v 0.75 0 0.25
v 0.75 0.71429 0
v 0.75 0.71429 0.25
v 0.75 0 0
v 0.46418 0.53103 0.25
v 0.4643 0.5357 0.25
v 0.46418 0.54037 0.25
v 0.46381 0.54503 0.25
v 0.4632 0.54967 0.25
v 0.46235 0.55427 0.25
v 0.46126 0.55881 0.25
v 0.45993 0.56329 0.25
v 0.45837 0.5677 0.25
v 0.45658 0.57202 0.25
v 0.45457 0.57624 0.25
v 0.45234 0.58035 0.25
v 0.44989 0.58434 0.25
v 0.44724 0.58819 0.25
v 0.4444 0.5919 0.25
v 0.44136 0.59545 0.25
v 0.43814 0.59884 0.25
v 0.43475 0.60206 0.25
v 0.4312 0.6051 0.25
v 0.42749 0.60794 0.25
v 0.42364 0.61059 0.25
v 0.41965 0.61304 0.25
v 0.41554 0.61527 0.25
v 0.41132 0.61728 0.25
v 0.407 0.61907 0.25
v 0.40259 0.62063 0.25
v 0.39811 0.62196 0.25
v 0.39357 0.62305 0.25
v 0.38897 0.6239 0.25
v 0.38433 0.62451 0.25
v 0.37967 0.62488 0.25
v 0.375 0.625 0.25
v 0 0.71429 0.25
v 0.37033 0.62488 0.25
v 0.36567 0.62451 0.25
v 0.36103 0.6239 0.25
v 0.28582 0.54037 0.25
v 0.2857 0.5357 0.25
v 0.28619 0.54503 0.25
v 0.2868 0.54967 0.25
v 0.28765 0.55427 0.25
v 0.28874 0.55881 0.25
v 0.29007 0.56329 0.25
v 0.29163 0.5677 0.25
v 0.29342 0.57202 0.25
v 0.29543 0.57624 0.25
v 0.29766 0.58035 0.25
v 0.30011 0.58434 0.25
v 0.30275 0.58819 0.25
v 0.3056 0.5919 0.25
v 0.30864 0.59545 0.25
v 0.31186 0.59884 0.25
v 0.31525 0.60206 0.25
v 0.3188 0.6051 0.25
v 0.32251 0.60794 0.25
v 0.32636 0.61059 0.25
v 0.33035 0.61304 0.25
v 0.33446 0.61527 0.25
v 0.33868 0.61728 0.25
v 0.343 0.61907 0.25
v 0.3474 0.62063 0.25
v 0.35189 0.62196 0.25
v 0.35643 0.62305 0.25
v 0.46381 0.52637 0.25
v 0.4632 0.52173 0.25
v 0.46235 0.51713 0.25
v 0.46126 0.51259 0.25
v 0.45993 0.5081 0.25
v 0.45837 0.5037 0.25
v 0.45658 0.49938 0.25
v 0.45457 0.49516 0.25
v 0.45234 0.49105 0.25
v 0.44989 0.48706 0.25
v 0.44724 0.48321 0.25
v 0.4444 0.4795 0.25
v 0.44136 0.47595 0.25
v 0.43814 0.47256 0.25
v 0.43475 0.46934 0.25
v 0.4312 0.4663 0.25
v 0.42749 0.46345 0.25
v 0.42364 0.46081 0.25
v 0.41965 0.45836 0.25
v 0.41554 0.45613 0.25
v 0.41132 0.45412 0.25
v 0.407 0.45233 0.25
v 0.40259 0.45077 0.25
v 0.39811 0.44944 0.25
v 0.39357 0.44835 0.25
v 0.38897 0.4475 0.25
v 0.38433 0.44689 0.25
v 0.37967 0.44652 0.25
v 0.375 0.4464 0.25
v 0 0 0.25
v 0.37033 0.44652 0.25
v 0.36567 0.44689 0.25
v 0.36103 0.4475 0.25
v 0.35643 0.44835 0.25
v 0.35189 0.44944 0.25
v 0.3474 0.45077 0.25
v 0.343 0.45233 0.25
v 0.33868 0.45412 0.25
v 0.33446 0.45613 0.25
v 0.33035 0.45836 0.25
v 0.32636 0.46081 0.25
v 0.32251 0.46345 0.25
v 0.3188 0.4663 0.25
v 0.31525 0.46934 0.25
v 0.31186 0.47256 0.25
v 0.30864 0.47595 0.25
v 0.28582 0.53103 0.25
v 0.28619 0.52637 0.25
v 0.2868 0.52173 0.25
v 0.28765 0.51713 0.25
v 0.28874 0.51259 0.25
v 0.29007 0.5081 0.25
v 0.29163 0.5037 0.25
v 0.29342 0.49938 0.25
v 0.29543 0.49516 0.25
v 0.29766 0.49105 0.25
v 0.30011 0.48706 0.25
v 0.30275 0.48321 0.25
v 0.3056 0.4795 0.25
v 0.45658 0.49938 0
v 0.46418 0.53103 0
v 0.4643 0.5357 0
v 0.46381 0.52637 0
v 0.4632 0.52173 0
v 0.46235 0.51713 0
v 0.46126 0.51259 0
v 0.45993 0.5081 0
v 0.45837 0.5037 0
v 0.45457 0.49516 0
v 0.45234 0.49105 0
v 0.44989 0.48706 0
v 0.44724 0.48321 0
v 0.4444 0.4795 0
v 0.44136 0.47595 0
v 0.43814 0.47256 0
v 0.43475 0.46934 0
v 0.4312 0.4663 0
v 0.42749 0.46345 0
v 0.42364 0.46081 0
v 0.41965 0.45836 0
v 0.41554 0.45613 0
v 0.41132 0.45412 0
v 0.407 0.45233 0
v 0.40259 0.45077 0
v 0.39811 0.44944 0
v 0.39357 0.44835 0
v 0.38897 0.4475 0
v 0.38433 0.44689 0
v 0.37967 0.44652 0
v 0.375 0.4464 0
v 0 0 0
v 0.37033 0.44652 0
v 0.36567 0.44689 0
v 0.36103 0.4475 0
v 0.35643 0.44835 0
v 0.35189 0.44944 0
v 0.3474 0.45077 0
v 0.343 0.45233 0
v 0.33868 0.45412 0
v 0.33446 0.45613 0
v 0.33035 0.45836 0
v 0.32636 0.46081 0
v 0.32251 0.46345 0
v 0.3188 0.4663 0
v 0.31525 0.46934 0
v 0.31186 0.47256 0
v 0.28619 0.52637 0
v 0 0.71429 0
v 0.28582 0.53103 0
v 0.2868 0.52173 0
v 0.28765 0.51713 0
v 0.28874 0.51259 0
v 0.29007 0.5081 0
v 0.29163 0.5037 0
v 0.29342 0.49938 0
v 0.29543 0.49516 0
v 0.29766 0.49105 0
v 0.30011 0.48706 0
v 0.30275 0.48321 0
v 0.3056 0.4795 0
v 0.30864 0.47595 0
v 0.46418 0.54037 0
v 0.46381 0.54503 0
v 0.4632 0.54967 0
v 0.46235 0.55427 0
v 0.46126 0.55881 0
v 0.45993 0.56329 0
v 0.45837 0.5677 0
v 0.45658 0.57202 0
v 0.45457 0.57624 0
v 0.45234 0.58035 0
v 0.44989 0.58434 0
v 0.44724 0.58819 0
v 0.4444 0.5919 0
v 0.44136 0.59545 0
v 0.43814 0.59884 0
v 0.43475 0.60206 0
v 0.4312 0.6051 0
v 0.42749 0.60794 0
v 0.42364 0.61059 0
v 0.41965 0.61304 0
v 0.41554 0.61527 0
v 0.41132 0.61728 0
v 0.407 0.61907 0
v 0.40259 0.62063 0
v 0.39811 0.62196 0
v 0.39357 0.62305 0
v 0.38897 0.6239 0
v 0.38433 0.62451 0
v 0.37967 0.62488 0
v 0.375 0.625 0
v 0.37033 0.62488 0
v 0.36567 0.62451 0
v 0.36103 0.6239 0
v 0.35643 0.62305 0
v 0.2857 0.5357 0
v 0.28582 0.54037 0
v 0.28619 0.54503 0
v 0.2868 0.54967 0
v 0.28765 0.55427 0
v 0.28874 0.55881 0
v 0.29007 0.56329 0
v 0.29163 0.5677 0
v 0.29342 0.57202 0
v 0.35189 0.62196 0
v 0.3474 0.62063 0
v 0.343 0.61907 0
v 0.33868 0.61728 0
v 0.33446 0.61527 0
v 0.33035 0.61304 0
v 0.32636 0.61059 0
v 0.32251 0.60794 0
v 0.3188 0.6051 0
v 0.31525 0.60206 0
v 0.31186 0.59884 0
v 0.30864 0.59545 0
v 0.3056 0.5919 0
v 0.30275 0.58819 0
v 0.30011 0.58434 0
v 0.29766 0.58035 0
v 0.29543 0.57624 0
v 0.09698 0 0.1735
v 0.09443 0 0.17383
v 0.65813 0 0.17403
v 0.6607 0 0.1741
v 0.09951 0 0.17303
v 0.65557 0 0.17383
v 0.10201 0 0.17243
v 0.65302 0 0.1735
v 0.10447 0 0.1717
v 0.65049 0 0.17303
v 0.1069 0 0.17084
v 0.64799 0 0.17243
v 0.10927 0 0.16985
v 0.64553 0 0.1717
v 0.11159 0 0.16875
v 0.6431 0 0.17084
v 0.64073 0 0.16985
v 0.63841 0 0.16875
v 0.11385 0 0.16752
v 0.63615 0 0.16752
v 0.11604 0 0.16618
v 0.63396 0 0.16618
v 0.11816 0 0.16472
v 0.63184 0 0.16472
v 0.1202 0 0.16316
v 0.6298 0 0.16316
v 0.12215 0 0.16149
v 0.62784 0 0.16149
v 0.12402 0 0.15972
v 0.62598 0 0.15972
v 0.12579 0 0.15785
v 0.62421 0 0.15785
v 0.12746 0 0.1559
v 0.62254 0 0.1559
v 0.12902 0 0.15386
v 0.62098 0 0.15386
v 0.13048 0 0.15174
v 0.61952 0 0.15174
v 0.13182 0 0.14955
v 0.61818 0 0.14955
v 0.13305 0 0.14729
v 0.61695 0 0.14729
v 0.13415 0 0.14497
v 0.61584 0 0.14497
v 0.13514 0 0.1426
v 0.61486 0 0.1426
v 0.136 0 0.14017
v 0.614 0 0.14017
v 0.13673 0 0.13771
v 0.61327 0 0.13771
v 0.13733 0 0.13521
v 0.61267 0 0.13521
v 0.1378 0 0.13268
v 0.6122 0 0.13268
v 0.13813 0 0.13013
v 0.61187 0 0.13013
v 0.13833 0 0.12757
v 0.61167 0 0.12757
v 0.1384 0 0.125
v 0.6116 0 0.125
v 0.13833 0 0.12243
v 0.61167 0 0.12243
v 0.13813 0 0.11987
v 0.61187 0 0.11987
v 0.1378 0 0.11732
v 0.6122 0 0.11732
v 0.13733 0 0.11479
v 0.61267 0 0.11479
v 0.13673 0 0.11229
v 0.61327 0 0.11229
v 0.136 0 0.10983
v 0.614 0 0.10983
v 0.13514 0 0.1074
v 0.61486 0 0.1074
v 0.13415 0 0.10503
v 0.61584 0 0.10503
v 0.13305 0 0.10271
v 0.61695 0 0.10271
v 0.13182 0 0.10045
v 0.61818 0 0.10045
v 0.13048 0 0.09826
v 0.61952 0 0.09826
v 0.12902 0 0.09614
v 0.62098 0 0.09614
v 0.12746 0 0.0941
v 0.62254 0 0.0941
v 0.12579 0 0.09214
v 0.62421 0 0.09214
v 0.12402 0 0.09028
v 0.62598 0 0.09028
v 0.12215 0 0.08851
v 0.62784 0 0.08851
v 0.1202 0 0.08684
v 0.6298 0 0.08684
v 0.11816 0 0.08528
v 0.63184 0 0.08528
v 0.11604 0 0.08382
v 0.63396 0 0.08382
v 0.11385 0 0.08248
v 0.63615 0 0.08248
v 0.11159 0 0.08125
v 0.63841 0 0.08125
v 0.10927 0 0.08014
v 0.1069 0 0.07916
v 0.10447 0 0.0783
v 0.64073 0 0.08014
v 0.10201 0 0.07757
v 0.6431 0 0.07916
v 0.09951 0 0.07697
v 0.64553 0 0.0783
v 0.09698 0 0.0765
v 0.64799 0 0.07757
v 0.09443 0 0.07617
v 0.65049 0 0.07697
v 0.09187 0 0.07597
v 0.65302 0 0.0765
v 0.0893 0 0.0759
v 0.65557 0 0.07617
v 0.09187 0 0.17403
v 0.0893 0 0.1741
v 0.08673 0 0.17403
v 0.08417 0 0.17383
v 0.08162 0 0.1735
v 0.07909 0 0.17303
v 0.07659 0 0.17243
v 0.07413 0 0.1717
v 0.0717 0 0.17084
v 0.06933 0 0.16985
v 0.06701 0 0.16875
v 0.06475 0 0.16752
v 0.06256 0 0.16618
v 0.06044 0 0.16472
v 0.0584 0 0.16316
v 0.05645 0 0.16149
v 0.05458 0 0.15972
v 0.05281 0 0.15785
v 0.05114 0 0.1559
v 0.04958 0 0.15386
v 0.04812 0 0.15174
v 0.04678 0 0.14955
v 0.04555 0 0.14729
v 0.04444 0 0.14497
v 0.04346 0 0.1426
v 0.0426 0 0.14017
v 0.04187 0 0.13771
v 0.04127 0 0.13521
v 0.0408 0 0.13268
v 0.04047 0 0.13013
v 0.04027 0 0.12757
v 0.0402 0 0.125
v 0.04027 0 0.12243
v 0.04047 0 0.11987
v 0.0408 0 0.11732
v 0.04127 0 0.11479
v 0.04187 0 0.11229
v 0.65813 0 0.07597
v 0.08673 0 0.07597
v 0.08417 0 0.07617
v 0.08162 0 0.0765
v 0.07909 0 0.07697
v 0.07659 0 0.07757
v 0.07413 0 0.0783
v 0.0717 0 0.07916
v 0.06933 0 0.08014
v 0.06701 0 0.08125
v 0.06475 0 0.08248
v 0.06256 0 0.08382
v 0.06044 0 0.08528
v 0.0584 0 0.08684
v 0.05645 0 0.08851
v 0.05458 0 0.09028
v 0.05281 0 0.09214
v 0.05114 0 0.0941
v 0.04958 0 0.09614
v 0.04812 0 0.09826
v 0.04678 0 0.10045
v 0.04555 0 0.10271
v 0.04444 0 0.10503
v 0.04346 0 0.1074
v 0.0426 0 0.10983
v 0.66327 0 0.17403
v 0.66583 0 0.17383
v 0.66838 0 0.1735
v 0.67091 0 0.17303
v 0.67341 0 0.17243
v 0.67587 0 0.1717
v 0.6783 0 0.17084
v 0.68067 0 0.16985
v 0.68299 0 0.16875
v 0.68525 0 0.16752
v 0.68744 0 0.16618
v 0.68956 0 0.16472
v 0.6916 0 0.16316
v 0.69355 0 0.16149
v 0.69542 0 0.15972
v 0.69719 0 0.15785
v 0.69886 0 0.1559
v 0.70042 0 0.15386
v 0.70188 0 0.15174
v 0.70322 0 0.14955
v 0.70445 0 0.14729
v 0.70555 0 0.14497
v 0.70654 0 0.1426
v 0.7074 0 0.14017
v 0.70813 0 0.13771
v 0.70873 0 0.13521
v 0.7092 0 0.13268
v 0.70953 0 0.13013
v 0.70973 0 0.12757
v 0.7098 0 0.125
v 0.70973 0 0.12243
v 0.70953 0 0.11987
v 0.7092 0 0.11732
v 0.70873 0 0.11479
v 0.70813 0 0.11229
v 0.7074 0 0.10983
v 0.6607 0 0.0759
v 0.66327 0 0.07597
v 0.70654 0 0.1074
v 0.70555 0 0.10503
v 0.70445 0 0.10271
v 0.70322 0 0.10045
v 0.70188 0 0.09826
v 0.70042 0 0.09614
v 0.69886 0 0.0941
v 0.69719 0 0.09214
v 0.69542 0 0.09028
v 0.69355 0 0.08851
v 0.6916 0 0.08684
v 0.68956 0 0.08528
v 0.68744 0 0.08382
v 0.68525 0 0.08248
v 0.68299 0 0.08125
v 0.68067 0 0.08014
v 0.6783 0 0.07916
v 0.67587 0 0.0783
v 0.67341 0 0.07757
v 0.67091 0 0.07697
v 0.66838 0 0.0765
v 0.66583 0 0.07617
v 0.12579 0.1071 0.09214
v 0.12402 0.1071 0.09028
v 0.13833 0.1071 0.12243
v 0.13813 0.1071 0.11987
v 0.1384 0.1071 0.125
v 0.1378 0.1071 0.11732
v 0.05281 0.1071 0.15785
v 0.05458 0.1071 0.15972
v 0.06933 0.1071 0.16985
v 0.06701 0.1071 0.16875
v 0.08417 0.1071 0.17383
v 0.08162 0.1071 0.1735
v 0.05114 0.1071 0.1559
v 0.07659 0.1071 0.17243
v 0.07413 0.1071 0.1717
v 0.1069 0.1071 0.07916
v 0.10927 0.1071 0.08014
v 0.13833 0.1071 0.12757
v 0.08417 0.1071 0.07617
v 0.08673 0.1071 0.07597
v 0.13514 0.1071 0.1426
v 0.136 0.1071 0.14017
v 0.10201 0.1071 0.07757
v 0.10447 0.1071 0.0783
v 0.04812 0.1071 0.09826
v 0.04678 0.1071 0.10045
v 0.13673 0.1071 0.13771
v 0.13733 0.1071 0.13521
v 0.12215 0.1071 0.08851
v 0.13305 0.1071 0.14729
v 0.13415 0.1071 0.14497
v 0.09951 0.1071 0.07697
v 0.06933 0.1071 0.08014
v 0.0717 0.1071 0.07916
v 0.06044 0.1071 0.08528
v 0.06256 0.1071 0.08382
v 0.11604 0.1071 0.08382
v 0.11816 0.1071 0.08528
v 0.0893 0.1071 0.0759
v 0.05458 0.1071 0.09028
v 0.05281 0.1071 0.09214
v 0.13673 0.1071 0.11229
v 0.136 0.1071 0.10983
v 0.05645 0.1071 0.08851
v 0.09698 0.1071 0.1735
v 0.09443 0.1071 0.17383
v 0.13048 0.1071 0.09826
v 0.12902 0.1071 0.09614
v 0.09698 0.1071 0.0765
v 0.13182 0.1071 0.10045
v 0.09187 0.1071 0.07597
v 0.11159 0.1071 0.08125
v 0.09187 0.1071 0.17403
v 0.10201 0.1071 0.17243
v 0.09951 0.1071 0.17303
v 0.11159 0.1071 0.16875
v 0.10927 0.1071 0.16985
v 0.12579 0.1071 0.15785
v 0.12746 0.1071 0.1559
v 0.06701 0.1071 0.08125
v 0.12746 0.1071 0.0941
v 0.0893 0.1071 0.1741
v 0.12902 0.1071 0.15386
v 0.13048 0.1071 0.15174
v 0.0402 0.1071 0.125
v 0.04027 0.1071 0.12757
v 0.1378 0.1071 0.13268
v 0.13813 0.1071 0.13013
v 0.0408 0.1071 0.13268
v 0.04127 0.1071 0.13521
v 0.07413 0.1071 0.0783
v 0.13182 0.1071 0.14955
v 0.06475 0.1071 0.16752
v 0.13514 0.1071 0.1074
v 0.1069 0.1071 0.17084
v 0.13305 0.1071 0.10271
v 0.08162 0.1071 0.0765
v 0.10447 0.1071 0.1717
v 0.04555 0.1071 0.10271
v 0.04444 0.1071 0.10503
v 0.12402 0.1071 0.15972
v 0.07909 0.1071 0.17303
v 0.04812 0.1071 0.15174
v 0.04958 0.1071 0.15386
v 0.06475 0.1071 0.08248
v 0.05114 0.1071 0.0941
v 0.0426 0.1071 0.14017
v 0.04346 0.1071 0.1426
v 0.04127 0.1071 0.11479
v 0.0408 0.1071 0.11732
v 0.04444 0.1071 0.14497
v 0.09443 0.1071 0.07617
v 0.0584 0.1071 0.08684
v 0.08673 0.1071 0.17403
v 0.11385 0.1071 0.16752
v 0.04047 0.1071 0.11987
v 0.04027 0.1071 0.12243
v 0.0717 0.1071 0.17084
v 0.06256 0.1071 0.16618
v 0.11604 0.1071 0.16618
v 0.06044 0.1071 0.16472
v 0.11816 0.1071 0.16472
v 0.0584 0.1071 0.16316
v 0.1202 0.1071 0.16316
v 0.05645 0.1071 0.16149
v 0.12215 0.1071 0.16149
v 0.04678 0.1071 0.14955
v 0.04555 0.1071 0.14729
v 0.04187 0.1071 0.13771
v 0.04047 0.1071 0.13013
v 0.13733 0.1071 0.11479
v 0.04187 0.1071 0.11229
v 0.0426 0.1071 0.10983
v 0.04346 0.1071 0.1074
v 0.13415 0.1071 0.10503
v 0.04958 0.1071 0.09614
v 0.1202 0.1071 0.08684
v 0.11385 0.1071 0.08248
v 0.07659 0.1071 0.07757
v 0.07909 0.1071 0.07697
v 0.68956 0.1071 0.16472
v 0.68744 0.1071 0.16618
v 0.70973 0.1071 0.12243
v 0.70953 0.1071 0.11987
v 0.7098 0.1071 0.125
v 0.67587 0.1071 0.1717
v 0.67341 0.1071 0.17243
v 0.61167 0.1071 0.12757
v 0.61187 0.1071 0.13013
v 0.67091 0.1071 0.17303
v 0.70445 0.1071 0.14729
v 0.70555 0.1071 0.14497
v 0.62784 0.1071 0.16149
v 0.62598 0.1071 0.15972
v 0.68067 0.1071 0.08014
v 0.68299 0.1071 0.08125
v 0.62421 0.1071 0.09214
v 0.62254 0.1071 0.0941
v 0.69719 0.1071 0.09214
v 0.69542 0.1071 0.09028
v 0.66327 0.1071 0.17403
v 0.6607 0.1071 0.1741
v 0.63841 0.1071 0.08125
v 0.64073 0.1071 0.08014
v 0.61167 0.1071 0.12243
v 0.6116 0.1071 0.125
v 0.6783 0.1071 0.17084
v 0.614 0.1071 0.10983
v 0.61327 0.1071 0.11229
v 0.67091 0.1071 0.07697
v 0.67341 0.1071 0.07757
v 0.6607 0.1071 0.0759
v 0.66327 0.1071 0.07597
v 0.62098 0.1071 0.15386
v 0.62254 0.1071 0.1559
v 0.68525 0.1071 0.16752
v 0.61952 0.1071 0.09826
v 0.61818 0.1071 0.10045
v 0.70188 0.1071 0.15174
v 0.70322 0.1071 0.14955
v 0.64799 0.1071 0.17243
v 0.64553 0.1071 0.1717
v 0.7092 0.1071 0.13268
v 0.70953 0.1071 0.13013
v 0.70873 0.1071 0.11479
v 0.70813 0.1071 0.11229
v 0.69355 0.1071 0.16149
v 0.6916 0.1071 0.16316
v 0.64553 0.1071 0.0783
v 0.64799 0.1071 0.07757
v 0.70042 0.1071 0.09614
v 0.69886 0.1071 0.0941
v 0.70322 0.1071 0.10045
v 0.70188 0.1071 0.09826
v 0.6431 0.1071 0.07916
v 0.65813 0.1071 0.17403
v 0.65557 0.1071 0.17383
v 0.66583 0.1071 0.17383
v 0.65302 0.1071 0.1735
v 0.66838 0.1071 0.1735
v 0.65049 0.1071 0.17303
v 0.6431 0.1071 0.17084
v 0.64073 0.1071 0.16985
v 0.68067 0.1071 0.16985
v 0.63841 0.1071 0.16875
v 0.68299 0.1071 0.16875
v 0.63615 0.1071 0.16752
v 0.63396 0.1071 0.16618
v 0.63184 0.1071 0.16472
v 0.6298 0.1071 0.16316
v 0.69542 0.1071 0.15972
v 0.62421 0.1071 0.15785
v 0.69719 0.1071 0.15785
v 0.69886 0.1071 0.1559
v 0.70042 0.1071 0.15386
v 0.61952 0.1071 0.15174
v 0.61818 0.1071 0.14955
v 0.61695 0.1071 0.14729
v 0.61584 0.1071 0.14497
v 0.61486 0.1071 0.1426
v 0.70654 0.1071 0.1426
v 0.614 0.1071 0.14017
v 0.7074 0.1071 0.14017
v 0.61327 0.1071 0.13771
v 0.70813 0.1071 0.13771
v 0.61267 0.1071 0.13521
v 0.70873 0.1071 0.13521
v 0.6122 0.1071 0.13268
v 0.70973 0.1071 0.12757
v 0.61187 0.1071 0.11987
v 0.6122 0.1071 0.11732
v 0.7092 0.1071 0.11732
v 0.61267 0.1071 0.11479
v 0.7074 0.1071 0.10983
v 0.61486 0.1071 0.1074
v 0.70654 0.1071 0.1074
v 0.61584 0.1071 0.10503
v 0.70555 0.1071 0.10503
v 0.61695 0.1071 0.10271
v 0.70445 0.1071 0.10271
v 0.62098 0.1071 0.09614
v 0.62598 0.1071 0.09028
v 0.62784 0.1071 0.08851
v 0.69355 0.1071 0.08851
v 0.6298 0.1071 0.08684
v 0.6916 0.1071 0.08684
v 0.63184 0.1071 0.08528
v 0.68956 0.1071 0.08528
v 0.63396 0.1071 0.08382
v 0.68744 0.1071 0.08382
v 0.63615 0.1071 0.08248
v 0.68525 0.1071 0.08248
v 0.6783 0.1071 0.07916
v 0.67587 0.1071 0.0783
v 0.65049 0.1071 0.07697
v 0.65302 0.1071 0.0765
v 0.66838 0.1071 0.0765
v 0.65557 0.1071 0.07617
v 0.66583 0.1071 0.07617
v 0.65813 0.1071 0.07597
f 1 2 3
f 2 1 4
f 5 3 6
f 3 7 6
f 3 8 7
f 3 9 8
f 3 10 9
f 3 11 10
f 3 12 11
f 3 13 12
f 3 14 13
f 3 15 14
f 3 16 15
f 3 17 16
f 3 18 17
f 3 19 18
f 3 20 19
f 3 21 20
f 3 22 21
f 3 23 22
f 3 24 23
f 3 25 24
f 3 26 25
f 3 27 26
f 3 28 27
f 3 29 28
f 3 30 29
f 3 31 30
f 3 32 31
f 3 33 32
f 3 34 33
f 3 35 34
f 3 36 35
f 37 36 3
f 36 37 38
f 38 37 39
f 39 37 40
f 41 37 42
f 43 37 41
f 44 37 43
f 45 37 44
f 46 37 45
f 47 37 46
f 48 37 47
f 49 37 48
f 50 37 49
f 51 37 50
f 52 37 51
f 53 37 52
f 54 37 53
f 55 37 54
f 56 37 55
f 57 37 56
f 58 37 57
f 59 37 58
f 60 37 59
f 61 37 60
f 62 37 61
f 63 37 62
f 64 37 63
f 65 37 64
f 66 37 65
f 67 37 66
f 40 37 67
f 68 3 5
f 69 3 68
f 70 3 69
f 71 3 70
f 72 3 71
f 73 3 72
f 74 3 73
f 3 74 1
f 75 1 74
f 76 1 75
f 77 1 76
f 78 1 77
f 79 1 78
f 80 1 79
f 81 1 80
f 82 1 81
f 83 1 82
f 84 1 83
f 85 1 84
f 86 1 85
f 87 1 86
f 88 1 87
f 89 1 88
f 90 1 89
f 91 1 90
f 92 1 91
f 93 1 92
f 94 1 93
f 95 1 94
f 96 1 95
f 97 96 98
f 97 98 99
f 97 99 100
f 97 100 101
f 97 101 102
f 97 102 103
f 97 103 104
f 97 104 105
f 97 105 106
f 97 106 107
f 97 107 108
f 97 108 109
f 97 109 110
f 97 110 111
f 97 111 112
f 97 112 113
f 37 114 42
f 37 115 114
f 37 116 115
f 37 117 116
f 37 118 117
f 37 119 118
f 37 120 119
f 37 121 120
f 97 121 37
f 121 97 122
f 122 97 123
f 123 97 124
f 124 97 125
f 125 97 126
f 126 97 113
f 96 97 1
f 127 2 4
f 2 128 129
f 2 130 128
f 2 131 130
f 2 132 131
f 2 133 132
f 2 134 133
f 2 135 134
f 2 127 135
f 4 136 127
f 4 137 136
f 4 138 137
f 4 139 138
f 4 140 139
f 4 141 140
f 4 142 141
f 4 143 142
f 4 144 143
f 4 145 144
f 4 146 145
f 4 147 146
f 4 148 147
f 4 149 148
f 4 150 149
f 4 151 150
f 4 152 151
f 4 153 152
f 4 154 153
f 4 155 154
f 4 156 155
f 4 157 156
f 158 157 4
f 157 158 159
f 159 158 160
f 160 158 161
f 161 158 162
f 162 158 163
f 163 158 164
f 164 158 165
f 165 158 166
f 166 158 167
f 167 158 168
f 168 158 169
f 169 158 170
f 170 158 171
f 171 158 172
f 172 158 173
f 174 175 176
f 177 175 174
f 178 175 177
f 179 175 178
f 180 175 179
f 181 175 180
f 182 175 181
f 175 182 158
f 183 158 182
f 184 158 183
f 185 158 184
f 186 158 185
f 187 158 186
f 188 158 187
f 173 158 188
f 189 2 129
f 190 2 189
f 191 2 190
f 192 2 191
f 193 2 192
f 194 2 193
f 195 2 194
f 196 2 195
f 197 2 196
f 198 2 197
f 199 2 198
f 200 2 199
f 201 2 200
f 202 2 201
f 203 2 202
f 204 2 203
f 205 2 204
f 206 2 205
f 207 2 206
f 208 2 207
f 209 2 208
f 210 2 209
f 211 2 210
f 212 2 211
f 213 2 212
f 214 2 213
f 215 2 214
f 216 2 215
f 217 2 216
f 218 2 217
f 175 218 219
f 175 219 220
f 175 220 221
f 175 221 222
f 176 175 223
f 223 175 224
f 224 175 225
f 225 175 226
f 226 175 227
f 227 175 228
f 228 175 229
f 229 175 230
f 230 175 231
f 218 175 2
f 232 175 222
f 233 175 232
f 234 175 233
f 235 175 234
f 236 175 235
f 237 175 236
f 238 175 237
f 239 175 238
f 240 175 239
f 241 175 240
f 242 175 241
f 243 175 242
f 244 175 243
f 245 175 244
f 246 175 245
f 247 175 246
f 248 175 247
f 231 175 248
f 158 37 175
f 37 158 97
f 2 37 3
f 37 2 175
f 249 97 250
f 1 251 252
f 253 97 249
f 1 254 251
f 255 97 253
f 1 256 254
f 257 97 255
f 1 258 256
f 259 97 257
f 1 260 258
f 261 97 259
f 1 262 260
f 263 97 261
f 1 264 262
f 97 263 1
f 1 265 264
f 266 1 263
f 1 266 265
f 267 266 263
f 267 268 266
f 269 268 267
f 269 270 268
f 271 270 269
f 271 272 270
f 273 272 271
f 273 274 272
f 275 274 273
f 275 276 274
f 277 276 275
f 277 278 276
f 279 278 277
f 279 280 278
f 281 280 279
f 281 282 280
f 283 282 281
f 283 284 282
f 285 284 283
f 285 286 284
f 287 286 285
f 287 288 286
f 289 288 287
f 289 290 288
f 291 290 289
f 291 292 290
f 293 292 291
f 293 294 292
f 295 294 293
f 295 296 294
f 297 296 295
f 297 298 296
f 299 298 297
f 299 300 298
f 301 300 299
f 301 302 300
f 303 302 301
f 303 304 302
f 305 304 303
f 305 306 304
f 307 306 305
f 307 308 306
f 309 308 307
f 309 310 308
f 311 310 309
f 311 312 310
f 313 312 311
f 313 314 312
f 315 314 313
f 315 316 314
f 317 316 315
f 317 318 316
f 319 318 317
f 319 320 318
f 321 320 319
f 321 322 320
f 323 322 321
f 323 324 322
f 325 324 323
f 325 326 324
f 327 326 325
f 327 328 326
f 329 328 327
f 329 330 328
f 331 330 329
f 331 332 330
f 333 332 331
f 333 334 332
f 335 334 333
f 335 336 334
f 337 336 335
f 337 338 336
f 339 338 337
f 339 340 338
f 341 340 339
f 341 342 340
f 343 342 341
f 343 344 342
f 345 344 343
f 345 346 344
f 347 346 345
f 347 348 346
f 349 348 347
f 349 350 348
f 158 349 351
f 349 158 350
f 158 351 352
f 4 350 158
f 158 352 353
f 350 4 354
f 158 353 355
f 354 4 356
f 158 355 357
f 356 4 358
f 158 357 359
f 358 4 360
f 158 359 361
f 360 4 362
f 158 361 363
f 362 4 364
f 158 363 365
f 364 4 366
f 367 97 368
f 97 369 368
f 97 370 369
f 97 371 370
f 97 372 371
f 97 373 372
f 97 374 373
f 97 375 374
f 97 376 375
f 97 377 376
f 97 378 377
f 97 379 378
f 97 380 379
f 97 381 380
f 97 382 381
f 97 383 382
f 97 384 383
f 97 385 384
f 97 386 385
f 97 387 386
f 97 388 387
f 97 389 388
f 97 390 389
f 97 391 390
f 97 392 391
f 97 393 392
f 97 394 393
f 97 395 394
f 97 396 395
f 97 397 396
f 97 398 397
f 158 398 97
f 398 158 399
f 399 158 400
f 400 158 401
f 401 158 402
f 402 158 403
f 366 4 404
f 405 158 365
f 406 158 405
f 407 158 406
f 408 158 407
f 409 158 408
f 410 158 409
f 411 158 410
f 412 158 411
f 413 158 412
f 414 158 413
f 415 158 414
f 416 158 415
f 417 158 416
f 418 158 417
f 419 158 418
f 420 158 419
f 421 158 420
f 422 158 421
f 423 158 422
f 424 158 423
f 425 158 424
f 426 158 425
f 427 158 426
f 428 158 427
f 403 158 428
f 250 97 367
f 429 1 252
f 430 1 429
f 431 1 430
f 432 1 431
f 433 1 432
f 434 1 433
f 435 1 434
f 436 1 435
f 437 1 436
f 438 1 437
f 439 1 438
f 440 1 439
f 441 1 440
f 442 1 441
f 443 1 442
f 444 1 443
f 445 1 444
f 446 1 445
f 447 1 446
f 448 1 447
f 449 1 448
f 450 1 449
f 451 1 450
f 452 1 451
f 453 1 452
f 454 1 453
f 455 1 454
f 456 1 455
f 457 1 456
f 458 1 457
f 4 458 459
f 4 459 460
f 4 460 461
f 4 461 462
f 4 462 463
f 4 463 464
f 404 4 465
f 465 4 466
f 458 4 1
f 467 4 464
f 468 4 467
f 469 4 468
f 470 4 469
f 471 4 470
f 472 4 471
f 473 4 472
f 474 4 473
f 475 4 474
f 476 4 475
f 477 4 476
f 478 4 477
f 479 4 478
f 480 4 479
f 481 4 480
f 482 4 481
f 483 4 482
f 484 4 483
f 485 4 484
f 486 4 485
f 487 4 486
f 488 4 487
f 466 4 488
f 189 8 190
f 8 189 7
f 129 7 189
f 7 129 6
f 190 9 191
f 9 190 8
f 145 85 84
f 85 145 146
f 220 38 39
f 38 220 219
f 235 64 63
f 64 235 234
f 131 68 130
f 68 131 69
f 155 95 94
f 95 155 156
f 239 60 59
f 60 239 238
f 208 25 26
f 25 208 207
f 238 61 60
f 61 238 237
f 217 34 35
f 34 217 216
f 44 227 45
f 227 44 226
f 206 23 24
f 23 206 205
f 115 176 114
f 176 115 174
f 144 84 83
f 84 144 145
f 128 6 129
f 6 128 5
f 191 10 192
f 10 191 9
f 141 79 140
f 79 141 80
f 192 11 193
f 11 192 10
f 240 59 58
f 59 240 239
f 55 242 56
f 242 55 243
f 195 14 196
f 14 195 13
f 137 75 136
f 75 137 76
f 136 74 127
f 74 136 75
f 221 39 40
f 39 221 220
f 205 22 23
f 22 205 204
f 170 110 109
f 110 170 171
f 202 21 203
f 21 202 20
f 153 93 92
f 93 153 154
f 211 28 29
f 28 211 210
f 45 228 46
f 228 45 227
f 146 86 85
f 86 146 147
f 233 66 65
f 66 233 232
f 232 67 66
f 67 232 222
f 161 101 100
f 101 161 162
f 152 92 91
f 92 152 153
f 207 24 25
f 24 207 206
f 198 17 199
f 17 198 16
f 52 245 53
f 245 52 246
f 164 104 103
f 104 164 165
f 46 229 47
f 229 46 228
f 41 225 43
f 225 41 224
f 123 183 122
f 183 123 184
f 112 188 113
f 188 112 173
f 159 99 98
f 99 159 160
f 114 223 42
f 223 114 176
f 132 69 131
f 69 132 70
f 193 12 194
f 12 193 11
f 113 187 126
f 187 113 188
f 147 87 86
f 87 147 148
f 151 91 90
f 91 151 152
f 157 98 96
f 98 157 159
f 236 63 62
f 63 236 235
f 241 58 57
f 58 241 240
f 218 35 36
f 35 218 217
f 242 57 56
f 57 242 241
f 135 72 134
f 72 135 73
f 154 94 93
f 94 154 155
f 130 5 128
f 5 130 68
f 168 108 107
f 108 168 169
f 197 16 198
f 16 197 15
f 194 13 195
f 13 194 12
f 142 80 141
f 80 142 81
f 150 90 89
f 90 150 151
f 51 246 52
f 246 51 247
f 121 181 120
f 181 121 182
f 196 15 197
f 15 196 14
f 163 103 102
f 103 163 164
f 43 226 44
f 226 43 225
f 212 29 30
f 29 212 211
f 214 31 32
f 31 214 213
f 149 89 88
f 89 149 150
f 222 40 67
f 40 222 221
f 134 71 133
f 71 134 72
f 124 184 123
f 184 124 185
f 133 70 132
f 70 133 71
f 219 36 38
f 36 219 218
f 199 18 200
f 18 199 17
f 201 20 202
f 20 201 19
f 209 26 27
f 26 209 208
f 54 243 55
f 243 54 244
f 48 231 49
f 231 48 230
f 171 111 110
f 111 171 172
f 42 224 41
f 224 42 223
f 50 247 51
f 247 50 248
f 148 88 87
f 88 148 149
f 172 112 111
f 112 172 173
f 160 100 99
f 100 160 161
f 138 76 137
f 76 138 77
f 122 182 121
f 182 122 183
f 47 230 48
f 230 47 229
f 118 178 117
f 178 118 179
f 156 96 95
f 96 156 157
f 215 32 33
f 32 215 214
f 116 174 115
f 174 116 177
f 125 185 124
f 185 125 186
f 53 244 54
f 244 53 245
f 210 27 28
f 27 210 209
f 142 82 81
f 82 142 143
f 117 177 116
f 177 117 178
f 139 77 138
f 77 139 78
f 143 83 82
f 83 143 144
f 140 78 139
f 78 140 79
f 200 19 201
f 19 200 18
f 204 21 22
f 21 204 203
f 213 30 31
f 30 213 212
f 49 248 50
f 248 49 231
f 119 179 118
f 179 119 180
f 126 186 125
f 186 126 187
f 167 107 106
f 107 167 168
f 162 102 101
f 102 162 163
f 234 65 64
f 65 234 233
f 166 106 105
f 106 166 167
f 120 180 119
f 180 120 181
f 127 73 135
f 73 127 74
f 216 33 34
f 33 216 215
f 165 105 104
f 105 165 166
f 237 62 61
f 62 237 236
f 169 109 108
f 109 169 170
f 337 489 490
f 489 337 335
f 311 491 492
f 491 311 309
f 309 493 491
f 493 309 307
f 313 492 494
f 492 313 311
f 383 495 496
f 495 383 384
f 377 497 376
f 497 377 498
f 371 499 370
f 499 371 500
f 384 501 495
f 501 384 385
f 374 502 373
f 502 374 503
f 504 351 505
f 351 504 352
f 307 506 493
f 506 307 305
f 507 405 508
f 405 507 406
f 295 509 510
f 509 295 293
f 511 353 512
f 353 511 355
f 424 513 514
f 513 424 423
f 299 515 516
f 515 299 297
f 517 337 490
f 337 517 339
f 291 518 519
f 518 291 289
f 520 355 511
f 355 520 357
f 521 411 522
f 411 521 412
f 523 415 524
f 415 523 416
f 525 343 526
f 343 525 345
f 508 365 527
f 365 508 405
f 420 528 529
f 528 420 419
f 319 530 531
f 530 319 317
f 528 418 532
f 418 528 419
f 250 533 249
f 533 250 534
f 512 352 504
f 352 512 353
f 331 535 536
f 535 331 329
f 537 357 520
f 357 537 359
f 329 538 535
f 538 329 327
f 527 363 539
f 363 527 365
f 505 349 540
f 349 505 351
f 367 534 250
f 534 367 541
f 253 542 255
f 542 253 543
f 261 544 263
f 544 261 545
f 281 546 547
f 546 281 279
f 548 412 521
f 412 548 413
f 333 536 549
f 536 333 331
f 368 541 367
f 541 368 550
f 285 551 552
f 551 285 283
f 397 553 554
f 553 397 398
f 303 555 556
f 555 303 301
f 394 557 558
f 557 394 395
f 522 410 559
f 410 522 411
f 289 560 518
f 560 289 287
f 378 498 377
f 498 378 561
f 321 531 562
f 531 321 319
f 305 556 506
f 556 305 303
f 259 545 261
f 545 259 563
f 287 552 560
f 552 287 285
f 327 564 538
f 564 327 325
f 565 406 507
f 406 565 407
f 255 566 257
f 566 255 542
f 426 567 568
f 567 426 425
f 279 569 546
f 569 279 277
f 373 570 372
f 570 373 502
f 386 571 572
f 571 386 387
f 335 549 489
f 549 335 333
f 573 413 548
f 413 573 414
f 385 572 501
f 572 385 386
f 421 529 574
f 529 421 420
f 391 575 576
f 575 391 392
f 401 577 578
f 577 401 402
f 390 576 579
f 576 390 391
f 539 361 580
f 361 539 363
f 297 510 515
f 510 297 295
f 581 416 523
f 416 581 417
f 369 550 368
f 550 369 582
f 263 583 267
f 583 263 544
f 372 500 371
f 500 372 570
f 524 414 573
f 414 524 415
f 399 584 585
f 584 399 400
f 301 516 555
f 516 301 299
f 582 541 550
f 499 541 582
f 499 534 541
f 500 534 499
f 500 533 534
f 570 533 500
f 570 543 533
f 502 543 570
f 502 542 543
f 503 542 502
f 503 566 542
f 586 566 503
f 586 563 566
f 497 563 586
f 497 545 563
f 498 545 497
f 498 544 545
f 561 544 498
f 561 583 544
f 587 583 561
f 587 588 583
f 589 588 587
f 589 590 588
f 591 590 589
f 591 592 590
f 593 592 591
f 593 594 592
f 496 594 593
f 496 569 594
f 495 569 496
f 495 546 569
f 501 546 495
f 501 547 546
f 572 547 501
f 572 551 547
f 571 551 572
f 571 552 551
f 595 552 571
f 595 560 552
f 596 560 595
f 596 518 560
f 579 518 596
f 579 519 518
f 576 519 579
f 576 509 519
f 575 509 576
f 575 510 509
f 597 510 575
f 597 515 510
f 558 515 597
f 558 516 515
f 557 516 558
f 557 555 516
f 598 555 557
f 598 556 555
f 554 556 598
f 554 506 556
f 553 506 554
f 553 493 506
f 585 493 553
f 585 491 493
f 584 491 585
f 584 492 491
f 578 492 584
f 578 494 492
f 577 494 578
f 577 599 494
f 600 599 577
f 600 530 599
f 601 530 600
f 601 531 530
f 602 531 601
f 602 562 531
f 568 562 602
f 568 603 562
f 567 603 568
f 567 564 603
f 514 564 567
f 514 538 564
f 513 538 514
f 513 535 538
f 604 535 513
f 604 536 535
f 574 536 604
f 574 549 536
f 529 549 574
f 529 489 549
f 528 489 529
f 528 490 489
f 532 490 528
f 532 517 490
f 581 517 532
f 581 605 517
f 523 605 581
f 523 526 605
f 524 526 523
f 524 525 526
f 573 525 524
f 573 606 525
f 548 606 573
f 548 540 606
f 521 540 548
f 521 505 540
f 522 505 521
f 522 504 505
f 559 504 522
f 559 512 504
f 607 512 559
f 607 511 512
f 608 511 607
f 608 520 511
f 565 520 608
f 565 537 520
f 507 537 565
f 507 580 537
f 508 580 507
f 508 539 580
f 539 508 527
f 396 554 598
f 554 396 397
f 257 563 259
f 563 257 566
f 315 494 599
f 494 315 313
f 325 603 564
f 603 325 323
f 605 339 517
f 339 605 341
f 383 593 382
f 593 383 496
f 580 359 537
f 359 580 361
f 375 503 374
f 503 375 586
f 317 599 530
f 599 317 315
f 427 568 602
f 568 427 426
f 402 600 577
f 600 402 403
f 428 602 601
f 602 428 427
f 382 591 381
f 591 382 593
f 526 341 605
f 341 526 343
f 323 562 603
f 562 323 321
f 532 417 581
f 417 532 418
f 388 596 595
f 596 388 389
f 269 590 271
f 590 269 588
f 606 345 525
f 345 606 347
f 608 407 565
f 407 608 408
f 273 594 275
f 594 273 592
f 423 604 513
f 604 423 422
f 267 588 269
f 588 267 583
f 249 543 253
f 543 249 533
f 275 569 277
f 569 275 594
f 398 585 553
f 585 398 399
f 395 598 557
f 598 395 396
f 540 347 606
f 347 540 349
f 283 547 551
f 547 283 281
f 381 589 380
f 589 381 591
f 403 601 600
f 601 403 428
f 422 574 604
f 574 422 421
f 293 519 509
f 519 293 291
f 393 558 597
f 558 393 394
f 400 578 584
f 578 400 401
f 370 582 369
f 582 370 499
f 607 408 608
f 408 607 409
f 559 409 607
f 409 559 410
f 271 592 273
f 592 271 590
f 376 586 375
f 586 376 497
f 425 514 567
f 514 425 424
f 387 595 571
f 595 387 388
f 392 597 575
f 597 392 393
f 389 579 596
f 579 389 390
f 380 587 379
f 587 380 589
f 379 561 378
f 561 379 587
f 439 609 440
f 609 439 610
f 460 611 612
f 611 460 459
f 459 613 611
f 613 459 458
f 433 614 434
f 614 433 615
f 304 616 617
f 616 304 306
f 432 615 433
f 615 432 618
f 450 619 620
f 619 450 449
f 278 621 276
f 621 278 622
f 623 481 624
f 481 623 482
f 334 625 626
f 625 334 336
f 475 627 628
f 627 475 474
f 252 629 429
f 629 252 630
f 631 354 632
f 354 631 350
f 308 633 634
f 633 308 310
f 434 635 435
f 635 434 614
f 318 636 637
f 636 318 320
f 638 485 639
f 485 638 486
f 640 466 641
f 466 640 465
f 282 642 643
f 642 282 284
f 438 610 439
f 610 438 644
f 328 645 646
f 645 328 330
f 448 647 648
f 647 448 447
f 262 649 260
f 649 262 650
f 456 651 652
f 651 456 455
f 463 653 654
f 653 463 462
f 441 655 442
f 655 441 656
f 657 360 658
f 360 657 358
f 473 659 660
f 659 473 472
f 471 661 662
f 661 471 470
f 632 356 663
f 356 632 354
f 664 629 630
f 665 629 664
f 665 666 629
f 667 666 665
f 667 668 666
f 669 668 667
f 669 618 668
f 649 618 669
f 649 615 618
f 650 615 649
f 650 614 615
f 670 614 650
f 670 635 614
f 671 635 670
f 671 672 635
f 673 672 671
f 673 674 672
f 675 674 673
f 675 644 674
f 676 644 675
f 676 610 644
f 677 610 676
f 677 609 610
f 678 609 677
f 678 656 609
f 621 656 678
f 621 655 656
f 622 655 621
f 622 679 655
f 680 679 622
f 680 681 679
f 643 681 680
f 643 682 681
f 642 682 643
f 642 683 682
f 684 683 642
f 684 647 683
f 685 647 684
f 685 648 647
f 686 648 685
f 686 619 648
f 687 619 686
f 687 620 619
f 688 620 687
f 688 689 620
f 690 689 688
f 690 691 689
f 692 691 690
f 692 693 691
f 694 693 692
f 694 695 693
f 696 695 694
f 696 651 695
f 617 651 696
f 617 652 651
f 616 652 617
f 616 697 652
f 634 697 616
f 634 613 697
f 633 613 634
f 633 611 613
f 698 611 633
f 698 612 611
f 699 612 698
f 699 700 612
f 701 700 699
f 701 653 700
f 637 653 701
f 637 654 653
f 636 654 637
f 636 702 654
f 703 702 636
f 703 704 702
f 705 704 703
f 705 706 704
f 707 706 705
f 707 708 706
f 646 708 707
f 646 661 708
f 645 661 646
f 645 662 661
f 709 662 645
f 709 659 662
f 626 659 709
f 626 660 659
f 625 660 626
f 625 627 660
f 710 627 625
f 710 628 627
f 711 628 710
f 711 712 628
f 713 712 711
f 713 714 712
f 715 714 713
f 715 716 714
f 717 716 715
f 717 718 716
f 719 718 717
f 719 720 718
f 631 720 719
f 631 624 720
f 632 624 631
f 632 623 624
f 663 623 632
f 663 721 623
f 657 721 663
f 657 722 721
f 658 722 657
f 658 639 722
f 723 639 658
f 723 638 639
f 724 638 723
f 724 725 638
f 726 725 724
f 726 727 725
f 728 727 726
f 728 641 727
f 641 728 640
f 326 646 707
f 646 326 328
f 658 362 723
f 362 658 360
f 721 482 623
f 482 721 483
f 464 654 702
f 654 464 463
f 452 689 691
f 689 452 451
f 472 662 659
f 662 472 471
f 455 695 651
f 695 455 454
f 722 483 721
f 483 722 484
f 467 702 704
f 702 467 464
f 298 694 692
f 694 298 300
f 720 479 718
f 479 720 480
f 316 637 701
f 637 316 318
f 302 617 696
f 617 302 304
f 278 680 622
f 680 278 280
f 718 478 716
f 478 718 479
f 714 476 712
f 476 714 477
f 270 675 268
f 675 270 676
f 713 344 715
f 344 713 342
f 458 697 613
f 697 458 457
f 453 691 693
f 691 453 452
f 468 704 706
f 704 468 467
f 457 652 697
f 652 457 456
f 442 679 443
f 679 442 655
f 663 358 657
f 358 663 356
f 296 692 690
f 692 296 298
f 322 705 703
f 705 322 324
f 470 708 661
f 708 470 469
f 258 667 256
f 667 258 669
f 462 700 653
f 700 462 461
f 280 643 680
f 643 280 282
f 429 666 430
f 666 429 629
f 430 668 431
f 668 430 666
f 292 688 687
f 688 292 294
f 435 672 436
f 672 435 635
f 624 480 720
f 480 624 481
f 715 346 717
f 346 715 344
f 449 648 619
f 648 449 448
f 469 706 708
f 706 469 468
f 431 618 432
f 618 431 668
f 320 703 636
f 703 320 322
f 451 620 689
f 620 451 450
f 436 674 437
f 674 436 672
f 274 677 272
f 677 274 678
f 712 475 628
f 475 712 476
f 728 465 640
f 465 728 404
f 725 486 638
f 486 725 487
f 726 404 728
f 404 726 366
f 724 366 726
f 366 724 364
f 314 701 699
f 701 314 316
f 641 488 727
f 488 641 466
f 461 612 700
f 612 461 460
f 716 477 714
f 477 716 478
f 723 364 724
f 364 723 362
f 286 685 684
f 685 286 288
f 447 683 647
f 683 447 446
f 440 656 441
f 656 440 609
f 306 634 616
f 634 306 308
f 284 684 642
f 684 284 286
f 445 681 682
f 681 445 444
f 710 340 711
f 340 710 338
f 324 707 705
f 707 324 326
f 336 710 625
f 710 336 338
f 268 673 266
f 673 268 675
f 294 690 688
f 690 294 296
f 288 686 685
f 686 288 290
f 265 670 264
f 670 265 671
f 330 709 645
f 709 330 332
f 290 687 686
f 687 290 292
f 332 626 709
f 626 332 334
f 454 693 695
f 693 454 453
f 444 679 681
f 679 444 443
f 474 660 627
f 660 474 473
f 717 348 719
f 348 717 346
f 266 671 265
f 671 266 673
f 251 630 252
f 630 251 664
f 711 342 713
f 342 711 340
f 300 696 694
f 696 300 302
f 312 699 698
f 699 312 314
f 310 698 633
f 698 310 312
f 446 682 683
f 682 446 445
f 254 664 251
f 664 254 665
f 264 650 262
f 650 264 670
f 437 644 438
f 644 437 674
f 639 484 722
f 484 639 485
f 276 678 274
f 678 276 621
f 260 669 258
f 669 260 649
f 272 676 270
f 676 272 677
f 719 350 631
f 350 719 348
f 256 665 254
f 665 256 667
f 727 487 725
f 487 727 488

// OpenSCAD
// Stepped Line-Profiled Block with Through Hole and Side Blind Holes

// ---- Overall Dimensions ----
L = 0.75;              // Overall length (X axis)
W = 0.714286;          // Overall width (Y axis)
H = 0.25;              // Overall height (Z axis) / main extrusion depth

// ---- Through Hole (Upper Circular Opening) ----
thru_x = 0.375;        // X center from left edge (midpoint of length)
thru_y = 0.5357;       // Y center from front edge
thru_r = 0.0893;       // Through hole radius

// ---- Side Blind Holes (Front Face Features) ----
side1_x = 0.0893;      // Hole 1 X center from left edge
side2_x = 0.6607;      // Hole 2 X center from left edge (L - side1_x)
side_r = 0.0491;       // Side hole radius
side_depth = 0.1071;   // Blind hole depth into front face
side_z_bot = 0.0759;   // Bottom extent of side hole above base
side_z_top = 0.1741;   // Top extent of side hole above base
side_z_ctr = (side_z_bot + side_z_top) / 2;  // Z center of side holes

// ---- Resolution ----
$fn = 120;

// ---- Tolerance for clean booleans ----
eps = 0.001;

// ---- Main Model ----
difference() {
    // Main solid: stepped line-profiled block extruded to full height
    cube([L, W, H]);

    // Upper through-opening: vertical circular hole cutting full height
    translate([thru_x, thru_y, -eps])
        cylinder(h = H + 2 * eps, r = thru_r);

    // Front side blind hole 1: circular cut into front face (Y=0 plane)
    translate([side1_x, -eps, side_z_ctr])
        rotate([-90, 0, 0])
            cylinder(h = side_depth + eps, r = side_r);

    // Front side blind hole 2: circular cut into front face (Y=0 plane)
    translate([side2_x, -eps, side_z_ctr])
        rotate([-90, 0, 0])
            cylinder(h = side_depth + eps, r = side_r);
}
